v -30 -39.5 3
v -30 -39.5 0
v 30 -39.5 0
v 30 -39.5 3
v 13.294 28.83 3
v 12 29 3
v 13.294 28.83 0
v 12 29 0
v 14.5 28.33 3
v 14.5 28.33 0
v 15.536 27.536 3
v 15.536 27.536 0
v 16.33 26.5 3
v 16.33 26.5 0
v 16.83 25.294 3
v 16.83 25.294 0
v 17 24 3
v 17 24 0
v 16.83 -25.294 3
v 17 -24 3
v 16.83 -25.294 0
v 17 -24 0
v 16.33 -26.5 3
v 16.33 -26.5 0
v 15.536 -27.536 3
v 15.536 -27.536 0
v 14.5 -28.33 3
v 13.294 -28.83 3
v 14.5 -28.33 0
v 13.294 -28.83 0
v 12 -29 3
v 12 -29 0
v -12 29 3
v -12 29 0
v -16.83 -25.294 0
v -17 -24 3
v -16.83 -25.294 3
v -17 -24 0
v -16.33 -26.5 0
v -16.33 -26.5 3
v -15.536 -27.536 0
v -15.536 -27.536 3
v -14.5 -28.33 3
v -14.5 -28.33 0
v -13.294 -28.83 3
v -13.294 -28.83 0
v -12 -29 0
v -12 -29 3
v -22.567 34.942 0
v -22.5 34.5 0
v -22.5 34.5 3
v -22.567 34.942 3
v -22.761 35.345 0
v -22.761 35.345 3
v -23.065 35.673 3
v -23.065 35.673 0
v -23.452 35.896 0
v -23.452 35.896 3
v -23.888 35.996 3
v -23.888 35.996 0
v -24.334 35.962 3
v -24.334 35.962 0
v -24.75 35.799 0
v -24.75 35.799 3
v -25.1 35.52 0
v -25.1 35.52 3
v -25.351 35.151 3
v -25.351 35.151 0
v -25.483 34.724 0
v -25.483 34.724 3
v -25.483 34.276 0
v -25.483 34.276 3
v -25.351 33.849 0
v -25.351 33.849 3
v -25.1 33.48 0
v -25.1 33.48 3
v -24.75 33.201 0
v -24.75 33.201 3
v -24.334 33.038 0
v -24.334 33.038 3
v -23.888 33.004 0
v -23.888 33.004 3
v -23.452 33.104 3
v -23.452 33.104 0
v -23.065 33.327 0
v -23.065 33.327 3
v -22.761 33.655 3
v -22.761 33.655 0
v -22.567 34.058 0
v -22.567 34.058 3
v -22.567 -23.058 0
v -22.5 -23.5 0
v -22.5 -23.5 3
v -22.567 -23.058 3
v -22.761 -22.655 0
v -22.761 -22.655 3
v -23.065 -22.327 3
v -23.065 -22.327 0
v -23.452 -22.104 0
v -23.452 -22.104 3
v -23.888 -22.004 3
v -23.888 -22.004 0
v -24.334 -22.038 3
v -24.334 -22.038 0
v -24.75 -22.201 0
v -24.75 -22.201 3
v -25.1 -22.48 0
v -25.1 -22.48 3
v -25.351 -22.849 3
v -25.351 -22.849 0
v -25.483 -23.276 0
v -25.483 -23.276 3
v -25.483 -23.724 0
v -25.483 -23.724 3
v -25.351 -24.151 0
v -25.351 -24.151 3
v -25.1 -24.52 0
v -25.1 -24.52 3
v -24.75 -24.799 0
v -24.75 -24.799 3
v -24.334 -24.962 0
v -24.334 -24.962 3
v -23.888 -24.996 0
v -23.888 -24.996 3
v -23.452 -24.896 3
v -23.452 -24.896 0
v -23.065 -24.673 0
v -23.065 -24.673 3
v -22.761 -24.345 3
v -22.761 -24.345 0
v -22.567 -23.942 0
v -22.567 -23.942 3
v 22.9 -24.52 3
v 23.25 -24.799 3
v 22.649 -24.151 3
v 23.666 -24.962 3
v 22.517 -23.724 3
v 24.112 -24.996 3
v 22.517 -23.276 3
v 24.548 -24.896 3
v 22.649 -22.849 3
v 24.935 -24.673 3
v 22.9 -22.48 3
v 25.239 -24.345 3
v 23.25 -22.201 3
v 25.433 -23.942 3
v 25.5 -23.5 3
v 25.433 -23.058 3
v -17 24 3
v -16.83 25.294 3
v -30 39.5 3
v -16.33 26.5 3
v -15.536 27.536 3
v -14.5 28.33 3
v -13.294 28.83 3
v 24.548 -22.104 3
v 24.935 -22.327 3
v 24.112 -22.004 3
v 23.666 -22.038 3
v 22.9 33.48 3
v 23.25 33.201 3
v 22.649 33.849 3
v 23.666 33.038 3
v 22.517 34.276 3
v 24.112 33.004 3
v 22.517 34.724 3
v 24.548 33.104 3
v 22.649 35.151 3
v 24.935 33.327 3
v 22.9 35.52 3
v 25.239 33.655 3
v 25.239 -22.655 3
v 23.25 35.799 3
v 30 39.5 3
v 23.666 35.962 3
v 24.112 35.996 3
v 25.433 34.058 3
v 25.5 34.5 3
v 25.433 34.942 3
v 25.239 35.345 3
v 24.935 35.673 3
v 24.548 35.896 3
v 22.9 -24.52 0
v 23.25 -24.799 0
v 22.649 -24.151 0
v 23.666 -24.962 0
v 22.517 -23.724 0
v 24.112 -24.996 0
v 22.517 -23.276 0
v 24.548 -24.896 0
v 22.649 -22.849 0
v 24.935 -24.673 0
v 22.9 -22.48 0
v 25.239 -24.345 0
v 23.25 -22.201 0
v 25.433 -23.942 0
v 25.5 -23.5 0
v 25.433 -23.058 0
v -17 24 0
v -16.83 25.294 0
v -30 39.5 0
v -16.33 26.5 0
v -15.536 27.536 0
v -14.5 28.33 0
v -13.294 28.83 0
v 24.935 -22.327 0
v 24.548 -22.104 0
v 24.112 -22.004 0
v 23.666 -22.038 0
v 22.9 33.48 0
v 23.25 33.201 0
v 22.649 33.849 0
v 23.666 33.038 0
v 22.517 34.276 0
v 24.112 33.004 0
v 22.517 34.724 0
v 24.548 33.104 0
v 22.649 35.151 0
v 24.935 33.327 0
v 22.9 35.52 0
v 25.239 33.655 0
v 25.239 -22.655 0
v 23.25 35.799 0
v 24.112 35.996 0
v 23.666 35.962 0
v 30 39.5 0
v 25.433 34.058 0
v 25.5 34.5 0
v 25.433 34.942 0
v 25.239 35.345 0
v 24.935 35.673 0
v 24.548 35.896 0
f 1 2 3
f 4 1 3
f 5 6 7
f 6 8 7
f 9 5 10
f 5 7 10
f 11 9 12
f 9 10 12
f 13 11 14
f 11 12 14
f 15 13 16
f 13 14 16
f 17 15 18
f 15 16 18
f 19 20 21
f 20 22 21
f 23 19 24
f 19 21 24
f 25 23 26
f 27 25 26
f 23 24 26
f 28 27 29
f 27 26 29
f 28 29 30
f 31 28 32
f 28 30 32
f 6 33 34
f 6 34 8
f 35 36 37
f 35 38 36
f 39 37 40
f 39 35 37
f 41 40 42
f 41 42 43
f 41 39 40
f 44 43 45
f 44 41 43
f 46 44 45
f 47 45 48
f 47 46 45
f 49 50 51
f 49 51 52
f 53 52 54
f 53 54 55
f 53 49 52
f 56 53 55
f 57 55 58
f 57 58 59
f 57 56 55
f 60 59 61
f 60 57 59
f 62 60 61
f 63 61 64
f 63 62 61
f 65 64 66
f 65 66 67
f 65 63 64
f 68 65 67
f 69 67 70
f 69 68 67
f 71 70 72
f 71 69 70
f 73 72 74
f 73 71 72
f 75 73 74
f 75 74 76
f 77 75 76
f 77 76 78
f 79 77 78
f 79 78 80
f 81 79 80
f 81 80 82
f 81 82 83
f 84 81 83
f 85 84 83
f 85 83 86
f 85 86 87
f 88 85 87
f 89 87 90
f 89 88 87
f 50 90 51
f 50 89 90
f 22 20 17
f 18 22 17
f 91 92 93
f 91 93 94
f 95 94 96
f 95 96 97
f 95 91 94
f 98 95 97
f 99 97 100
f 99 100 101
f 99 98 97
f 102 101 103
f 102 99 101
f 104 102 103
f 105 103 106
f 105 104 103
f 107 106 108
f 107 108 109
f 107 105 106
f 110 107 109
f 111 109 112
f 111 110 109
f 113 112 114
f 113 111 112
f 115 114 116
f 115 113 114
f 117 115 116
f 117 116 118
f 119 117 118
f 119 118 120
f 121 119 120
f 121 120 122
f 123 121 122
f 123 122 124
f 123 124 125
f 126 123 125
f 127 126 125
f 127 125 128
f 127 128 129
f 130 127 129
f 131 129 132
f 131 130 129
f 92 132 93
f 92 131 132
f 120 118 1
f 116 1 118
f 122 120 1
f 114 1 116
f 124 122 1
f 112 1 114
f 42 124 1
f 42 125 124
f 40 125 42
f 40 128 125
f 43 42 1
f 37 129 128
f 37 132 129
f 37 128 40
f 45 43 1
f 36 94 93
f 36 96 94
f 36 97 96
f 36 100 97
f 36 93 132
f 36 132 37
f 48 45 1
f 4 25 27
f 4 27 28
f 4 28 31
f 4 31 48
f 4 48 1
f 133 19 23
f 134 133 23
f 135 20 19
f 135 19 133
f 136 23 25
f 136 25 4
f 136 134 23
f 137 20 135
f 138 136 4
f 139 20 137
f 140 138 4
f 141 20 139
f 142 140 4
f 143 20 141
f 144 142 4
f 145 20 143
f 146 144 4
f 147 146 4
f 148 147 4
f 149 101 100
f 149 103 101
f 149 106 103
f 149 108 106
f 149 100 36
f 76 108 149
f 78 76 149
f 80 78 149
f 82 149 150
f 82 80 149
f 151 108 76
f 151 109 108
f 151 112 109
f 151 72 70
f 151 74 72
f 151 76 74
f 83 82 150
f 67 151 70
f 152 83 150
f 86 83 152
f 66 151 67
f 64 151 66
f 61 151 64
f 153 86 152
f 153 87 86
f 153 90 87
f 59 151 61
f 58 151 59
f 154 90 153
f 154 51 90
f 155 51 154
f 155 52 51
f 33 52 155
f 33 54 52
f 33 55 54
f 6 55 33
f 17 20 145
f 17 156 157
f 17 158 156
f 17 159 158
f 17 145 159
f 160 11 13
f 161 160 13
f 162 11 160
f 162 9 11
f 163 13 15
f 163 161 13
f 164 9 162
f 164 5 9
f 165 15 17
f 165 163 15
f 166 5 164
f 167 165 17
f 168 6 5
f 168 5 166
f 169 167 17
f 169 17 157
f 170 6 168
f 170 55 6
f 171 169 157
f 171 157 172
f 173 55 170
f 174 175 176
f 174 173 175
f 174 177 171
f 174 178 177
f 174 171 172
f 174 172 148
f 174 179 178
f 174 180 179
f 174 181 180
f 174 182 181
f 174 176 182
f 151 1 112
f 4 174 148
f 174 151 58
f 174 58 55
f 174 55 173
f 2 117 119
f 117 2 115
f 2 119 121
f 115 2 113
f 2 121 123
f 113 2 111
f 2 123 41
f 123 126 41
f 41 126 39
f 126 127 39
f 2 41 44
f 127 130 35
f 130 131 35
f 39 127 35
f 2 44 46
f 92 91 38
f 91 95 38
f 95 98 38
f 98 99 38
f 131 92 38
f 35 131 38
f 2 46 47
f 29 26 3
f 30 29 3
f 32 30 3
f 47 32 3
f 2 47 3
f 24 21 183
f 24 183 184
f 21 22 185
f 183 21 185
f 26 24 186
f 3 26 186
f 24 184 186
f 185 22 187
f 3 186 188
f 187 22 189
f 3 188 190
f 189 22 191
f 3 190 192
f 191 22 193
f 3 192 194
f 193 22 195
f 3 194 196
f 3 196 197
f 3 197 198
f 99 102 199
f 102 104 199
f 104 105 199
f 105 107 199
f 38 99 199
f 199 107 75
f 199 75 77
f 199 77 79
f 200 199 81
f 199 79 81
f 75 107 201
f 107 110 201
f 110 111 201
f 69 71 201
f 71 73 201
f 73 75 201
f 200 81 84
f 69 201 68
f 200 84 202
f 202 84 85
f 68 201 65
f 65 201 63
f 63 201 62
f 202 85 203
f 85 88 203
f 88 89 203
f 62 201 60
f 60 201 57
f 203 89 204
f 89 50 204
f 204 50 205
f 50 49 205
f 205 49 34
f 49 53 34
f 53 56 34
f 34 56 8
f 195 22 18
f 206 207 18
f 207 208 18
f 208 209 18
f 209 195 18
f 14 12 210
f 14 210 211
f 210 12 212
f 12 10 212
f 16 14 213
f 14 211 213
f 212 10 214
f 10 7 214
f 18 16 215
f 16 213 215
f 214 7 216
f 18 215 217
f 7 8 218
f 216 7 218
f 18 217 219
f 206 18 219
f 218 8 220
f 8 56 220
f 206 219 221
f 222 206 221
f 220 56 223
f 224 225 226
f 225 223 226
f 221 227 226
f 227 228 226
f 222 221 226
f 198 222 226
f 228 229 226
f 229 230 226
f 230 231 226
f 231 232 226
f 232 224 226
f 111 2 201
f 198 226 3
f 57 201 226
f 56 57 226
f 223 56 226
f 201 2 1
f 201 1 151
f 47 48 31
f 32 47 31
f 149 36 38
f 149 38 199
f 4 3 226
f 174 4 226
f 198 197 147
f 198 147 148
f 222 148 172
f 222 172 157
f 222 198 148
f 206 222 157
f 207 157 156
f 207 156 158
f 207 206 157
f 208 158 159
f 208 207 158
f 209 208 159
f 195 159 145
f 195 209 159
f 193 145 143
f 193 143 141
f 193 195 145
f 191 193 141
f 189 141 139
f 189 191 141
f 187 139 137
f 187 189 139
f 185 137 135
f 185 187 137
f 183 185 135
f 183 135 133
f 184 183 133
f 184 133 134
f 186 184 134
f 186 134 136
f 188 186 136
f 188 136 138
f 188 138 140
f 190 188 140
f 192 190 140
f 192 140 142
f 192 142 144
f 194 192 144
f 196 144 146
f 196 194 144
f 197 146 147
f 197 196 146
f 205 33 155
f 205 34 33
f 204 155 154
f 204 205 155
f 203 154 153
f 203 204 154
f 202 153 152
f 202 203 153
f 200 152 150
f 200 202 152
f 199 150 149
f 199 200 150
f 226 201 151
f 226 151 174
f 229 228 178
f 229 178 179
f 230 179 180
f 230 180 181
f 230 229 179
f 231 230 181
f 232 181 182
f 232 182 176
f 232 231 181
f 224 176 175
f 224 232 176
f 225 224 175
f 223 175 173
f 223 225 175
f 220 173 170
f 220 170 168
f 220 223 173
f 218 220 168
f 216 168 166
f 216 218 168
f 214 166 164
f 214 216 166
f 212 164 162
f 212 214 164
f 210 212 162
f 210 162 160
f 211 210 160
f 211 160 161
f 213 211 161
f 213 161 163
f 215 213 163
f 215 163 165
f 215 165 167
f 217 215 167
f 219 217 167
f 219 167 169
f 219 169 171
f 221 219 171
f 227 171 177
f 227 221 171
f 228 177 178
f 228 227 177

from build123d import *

# Parameters (mm, degrees)
F0_W     = 60
F0_H     = 79
F0_R     = 1.5
F1_DEPTH = 3
F2_W     = 34
F2_H     = 58
F3_DEPTH = 3
F4_R     = 5
F5_R     = 5


with BuildPart() as f1:
    # F0 (on Top) → F1 (new body)
    with BuildSketch(Plane.XY):
        Rectangle(F0_W, F0_H)
        with Locations((-24, -23.5)):
            Circle(F0_R, mode=Mode.SUBTRACT)
        with Locations((24, -23.5)):
            Circle(F0_R, mode=Mode.SUBTRACT)
        with Locations((-24, 34.5)):
            Circle(F0_R, mode=Mode.SUBTRACT)
        with Locations((24, 34.5)):
            Circle(F0_R, mode=Mode.SUBTRACT)
    extrude(amount=F1_DEPTH)

    # F2 (on face) → F3 (cut, through all)
    with BuildSketch(Plane.XY.offset(3)):
        Rectangle(F2_W, F2_H)
    extrude(amount=-F3_DEPTH, mode=Mode.SUBTRACT)

    # F4
    f4_edges = [f1.edges().sort_by_distance(p)[0] for p in [
        (-17, 29, 1.5),
    ]]
    fillet(f4_edges, radius=F4_R)

    # F5
    f5_edges = [f1.edges().sort_by_distance(p)[0] for p in [
        (-17, -29, 1.5),
        (17, -29, 1.5),
        (17, 29, 1.5),
    ]]
    fillet(f5_edges, radius=F5_R)


solid = f1.part
